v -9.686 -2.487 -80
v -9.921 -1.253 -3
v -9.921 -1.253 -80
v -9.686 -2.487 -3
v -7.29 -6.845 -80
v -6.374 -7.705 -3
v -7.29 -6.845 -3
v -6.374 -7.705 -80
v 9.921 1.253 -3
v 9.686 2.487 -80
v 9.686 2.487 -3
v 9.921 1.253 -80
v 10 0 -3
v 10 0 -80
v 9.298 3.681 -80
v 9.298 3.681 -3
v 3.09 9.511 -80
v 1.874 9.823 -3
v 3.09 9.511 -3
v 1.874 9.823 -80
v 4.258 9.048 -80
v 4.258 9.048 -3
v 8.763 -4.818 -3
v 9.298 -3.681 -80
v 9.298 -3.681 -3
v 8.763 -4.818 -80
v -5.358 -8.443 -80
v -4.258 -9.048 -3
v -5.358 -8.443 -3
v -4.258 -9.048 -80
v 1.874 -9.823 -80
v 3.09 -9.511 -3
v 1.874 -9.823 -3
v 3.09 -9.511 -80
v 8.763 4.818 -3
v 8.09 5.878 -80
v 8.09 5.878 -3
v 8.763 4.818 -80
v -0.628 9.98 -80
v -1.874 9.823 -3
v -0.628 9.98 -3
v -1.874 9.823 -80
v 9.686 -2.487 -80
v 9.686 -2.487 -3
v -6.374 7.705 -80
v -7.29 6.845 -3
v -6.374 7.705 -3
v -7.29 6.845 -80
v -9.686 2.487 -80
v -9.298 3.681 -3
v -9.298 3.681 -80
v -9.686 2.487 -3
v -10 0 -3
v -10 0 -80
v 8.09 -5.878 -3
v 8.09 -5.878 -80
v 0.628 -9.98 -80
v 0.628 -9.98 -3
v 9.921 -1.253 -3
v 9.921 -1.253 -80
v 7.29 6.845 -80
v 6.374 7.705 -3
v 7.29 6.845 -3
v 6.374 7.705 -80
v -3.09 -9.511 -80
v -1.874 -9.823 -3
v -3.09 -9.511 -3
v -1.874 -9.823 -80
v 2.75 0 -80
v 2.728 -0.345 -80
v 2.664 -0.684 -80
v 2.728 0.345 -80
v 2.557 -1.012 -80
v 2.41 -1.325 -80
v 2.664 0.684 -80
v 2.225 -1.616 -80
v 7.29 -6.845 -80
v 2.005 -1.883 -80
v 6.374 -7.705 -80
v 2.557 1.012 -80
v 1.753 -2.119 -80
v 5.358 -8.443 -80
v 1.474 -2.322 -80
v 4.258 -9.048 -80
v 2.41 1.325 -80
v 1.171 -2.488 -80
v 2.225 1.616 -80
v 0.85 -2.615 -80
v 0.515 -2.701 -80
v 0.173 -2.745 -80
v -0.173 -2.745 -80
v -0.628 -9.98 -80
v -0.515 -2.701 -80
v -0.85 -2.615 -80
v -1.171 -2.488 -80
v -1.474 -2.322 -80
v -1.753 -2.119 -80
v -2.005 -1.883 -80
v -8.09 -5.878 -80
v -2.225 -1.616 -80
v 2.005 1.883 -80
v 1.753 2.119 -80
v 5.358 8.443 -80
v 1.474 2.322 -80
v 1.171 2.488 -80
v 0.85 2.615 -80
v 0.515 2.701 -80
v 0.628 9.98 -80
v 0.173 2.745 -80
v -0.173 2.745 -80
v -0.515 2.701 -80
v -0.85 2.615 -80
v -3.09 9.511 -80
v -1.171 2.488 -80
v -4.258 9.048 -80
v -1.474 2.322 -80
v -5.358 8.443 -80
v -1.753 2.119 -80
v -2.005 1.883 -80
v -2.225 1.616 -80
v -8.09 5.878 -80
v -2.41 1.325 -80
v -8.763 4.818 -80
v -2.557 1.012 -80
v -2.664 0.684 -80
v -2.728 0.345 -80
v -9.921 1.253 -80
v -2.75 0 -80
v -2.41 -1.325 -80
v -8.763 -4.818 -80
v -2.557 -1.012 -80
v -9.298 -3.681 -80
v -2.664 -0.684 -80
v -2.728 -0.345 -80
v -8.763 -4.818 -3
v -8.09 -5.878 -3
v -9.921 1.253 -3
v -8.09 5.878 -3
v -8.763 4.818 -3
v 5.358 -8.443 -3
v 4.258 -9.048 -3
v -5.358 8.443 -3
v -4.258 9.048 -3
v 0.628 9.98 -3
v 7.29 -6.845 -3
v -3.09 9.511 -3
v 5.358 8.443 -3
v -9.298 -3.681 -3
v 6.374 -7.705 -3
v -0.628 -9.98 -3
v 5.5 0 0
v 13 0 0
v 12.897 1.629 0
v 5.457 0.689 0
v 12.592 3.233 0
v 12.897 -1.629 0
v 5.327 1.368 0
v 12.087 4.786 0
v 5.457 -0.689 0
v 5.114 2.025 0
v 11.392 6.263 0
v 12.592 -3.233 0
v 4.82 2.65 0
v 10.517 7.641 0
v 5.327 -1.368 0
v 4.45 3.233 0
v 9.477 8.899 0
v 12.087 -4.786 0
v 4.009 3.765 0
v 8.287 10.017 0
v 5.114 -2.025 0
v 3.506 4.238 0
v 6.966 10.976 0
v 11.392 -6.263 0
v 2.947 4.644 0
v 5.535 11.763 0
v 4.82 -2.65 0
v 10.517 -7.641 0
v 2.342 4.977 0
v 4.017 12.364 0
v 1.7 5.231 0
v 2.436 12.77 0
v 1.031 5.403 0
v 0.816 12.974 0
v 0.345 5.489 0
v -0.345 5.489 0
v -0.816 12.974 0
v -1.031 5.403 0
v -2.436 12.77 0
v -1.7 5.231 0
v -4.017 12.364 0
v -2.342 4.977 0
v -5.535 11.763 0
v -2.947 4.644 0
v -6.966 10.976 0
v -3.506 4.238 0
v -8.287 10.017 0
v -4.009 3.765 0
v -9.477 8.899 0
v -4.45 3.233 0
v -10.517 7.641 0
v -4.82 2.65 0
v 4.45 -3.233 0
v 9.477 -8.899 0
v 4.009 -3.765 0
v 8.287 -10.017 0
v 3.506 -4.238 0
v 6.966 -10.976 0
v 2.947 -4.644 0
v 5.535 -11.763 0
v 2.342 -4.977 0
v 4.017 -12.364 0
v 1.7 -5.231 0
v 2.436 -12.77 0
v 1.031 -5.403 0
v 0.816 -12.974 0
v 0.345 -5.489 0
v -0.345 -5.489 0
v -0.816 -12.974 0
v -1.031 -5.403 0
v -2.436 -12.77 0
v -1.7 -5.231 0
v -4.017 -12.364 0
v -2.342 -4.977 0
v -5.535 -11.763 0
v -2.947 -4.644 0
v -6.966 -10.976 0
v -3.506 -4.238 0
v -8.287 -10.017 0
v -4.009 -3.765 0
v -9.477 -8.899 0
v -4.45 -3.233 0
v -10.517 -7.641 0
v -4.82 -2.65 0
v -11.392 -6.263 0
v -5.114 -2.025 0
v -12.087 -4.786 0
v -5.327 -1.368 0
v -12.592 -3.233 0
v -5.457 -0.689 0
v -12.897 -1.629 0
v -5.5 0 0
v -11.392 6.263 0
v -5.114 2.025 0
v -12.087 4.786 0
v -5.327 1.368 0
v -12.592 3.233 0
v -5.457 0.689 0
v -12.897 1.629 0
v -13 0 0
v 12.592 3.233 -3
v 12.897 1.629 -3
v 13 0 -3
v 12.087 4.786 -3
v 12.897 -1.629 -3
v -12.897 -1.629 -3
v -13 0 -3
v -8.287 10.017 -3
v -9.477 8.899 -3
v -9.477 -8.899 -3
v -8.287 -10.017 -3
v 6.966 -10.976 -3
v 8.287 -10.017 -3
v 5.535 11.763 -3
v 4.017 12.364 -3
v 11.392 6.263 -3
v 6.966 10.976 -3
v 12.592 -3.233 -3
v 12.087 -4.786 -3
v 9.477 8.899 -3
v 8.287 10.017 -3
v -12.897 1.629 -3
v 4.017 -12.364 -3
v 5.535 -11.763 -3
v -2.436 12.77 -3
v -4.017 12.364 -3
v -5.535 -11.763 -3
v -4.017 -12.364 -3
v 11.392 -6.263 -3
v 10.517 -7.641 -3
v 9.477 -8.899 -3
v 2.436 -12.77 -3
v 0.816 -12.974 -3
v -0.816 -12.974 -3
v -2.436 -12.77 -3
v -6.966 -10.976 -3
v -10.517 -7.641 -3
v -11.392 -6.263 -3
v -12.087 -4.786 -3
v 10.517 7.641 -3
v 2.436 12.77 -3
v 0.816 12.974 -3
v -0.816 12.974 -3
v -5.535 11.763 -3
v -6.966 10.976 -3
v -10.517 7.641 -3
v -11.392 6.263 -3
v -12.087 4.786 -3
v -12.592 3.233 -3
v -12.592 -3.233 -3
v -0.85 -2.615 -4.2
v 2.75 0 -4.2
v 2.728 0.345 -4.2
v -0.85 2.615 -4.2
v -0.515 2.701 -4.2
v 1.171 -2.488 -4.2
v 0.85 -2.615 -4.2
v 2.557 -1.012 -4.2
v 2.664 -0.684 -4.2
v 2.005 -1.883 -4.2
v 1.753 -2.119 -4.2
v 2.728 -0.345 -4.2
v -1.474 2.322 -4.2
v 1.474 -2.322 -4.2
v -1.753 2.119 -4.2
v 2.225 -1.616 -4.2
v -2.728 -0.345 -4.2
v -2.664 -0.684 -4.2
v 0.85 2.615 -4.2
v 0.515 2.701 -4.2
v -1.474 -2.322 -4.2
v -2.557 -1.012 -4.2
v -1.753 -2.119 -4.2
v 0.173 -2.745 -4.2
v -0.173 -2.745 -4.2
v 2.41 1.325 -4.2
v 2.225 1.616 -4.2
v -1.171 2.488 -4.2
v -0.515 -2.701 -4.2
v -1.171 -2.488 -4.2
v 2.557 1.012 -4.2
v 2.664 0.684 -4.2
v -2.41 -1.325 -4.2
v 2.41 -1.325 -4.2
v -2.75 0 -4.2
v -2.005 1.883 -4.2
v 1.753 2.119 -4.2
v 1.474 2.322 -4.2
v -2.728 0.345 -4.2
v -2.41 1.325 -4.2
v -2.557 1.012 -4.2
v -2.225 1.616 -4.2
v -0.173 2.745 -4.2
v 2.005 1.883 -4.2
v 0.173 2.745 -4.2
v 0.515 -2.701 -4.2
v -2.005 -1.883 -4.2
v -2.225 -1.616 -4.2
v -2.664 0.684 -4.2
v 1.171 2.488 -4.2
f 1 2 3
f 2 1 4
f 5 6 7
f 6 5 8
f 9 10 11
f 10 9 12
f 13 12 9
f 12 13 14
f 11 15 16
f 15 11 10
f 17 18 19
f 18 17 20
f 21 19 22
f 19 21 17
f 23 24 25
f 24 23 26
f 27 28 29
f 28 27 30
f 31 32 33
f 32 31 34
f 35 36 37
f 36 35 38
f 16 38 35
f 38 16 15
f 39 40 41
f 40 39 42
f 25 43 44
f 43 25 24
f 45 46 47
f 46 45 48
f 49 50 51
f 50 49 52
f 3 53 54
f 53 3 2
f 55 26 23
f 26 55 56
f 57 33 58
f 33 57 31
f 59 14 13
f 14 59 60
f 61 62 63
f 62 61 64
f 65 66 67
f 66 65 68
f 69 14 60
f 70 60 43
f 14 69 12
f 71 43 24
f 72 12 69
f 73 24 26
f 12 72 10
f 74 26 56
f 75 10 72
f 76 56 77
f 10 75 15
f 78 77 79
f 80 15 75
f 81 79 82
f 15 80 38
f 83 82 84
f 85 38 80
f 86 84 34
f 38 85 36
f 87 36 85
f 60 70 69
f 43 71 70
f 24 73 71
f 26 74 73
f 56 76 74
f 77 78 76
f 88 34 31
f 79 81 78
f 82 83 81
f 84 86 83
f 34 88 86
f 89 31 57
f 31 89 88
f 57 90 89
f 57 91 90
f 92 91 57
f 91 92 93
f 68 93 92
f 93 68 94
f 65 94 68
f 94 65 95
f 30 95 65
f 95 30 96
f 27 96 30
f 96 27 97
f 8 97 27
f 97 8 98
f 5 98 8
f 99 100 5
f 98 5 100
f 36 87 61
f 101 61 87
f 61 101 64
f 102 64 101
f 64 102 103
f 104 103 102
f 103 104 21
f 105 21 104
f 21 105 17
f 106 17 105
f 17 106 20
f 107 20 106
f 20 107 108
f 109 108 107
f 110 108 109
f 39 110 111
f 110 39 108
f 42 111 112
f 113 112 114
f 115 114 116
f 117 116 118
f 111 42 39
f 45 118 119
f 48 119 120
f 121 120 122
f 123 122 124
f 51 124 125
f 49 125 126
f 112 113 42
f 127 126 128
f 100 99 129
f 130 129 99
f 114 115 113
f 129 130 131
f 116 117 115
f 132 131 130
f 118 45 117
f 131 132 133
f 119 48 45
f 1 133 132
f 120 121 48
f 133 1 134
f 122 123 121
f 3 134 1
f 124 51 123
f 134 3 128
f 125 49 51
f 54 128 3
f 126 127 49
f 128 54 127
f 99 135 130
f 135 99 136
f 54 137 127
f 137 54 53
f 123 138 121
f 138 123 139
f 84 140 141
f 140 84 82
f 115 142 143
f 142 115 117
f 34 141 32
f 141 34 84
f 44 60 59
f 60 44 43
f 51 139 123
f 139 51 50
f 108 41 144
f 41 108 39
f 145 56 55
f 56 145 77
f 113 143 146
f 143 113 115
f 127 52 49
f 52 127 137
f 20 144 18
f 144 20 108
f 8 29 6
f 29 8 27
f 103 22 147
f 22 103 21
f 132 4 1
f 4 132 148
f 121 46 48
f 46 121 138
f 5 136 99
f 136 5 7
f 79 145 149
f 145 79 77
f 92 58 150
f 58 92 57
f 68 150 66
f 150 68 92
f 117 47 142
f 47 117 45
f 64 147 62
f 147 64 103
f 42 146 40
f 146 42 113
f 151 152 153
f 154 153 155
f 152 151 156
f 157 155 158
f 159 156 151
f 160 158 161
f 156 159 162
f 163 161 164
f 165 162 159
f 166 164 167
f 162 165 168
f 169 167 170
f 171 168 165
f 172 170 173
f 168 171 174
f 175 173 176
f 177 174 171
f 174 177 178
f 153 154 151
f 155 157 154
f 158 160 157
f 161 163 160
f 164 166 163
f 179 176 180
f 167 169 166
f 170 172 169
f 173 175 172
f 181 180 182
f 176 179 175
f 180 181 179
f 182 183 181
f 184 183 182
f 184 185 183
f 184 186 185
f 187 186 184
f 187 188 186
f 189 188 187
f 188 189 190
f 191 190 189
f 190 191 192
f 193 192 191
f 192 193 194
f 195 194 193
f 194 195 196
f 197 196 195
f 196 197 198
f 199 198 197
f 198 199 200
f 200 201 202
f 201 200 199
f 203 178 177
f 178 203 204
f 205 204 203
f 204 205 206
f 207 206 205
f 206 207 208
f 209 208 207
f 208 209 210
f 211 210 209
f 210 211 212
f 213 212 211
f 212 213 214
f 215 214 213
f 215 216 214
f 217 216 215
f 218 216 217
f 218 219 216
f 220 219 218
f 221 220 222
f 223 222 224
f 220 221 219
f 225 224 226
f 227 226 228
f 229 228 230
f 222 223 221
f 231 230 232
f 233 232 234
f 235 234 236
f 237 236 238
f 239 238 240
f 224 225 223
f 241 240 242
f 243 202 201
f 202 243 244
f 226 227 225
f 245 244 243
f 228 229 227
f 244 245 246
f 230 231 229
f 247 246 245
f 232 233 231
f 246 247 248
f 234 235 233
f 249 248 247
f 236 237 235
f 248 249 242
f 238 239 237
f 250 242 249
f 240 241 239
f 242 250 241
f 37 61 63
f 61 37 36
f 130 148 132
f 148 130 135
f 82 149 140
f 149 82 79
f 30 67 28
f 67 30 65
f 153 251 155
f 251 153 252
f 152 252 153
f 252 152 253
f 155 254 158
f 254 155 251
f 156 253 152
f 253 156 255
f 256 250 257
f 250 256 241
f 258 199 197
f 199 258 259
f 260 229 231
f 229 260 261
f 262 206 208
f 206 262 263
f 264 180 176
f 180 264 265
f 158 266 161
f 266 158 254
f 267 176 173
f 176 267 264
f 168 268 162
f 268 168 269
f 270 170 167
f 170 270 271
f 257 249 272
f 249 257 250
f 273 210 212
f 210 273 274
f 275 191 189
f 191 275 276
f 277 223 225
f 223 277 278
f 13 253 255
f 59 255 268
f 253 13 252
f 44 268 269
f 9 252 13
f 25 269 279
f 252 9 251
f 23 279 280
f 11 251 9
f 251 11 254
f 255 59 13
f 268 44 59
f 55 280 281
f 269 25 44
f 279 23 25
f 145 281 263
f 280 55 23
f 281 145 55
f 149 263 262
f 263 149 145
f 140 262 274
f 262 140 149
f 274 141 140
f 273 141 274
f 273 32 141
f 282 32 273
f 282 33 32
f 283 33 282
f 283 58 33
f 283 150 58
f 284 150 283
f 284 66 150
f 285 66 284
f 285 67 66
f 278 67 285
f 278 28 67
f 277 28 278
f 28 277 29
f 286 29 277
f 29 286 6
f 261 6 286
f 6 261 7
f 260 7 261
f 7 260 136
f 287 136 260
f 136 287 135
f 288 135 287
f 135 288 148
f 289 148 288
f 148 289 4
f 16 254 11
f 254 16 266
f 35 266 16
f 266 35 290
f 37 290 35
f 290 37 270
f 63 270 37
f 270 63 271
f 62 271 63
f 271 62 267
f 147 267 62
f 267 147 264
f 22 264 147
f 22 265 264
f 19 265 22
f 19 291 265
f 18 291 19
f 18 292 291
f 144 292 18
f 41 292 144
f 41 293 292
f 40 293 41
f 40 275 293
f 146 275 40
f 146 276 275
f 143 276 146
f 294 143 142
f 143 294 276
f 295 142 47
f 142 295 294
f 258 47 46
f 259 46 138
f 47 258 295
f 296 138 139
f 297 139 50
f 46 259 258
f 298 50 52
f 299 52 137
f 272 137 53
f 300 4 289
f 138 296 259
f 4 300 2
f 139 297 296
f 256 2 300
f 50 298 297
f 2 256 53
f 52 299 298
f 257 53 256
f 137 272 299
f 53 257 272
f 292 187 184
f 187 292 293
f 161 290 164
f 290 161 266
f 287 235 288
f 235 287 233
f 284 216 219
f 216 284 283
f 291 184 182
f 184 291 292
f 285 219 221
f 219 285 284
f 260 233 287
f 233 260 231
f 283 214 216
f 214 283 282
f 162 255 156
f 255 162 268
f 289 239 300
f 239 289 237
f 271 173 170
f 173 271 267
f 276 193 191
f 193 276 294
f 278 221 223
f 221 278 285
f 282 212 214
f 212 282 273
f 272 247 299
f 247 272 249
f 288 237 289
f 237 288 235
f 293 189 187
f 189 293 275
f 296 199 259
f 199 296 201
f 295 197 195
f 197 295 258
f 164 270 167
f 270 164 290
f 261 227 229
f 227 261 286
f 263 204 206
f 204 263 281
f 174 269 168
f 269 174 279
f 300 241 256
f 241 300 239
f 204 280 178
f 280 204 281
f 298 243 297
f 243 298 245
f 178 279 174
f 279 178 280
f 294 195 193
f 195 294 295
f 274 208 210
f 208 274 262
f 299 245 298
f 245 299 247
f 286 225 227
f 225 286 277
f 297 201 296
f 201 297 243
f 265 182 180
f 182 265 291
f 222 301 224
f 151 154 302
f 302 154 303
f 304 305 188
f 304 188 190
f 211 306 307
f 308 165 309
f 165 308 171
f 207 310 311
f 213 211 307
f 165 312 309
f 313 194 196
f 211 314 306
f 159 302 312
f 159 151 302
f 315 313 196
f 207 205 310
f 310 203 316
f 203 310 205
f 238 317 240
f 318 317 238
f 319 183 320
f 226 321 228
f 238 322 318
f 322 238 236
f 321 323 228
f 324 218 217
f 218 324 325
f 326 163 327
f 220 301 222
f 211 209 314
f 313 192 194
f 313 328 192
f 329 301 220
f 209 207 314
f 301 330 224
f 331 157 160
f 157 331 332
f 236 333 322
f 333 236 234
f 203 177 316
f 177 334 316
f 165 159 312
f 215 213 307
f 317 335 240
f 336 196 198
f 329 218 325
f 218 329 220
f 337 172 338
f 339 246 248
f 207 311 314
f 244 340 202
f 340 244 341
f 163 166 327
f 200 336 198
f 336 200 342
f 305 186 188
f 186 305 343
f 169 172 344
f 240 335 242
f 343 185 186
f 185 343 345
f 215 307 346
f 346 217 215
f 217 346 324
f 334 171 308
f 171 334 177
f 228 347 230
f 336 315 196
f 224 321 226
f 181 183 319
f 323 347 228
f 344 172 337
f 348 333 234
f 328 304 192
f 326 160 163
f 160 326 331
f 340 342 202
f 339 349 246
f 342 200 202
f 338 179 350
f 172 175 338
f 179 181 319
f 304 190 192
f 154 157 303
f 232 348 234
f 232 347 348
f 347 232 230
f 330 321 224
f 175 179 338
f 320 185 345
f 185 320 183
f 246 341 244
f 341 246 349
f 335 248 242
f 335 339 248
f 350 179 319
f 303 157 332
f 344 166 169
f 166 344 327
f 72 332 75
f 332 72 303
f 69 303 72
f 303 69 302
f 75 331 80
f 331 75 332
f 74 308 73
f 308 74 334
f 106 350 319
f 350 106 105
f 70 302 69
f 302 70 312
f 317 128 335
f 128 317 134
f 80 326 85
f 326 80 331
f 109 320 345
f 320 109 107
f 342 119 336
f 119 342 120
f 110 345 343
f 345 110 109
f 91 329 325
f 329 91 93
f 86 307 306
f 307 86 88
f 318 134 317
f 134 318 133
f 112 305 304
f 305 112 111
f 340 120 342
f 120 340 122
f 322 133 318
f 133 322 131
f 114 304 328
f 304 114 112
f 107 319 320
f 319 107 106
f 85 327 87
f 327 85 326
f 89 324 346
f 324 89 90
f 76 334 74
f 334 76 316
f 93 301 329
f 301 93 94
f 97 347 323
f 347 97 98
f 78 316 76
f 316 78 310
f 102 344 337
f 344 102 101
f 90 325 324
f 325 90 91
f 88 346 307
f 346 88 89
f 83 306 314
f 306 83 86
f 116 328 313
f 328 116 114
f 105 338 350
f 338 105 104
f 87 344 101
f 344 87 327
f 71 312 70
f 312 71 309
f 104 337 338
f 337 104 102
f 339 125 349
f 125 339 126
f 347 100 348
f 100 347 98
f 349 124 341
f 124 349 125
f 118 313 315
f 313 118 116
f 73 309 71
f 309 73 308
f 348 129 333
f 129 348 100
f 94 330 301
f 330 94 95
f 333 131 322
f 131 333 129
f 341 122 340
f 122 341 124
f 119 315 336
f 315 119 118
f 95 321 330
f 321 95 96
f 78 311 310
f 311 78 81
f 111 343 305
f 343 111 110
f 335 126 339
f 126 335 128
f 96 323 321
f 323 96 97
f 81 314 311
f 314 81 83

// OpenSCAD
$fn = 50;


difference() {
	union() {
		translate(v = [0, 0, -80.0000000000]) {
			cylinder(h = 80, r = 10.0000000000);
		}
		translate(v = [0, 0, -3.0000000000]) {
			cylinder(h = 3, r = 13.0000000000);
		}
	}
	union() {
		translate(v = [0, 0, 0]) {
			rotate(a = [0, 0, 0]) {
				difference() {
					union() {
						#translate(v = [0, 0, -80.0000000000]) {
							cylinder(h = 80, r = 2.2500000000);
						}
						#translate(v = [0, 0, -4.2000000000]) {
							cylinder(h = 4.2000000000, r = 10.0000000000, r1 = 2.7500000000, r2 = 5.5000000000);
						}
						#translate(v = [0, 0, -80.0000000000]) {
							cylinder(h = 80, r = 2.7500000000);
						}
						#translate(v = [0, 0, -80.0000000000]) {
							cylinder(h = 80, r = 2.2500000000);
						}
					}
					union();
				}
			}
		}
	}
}
